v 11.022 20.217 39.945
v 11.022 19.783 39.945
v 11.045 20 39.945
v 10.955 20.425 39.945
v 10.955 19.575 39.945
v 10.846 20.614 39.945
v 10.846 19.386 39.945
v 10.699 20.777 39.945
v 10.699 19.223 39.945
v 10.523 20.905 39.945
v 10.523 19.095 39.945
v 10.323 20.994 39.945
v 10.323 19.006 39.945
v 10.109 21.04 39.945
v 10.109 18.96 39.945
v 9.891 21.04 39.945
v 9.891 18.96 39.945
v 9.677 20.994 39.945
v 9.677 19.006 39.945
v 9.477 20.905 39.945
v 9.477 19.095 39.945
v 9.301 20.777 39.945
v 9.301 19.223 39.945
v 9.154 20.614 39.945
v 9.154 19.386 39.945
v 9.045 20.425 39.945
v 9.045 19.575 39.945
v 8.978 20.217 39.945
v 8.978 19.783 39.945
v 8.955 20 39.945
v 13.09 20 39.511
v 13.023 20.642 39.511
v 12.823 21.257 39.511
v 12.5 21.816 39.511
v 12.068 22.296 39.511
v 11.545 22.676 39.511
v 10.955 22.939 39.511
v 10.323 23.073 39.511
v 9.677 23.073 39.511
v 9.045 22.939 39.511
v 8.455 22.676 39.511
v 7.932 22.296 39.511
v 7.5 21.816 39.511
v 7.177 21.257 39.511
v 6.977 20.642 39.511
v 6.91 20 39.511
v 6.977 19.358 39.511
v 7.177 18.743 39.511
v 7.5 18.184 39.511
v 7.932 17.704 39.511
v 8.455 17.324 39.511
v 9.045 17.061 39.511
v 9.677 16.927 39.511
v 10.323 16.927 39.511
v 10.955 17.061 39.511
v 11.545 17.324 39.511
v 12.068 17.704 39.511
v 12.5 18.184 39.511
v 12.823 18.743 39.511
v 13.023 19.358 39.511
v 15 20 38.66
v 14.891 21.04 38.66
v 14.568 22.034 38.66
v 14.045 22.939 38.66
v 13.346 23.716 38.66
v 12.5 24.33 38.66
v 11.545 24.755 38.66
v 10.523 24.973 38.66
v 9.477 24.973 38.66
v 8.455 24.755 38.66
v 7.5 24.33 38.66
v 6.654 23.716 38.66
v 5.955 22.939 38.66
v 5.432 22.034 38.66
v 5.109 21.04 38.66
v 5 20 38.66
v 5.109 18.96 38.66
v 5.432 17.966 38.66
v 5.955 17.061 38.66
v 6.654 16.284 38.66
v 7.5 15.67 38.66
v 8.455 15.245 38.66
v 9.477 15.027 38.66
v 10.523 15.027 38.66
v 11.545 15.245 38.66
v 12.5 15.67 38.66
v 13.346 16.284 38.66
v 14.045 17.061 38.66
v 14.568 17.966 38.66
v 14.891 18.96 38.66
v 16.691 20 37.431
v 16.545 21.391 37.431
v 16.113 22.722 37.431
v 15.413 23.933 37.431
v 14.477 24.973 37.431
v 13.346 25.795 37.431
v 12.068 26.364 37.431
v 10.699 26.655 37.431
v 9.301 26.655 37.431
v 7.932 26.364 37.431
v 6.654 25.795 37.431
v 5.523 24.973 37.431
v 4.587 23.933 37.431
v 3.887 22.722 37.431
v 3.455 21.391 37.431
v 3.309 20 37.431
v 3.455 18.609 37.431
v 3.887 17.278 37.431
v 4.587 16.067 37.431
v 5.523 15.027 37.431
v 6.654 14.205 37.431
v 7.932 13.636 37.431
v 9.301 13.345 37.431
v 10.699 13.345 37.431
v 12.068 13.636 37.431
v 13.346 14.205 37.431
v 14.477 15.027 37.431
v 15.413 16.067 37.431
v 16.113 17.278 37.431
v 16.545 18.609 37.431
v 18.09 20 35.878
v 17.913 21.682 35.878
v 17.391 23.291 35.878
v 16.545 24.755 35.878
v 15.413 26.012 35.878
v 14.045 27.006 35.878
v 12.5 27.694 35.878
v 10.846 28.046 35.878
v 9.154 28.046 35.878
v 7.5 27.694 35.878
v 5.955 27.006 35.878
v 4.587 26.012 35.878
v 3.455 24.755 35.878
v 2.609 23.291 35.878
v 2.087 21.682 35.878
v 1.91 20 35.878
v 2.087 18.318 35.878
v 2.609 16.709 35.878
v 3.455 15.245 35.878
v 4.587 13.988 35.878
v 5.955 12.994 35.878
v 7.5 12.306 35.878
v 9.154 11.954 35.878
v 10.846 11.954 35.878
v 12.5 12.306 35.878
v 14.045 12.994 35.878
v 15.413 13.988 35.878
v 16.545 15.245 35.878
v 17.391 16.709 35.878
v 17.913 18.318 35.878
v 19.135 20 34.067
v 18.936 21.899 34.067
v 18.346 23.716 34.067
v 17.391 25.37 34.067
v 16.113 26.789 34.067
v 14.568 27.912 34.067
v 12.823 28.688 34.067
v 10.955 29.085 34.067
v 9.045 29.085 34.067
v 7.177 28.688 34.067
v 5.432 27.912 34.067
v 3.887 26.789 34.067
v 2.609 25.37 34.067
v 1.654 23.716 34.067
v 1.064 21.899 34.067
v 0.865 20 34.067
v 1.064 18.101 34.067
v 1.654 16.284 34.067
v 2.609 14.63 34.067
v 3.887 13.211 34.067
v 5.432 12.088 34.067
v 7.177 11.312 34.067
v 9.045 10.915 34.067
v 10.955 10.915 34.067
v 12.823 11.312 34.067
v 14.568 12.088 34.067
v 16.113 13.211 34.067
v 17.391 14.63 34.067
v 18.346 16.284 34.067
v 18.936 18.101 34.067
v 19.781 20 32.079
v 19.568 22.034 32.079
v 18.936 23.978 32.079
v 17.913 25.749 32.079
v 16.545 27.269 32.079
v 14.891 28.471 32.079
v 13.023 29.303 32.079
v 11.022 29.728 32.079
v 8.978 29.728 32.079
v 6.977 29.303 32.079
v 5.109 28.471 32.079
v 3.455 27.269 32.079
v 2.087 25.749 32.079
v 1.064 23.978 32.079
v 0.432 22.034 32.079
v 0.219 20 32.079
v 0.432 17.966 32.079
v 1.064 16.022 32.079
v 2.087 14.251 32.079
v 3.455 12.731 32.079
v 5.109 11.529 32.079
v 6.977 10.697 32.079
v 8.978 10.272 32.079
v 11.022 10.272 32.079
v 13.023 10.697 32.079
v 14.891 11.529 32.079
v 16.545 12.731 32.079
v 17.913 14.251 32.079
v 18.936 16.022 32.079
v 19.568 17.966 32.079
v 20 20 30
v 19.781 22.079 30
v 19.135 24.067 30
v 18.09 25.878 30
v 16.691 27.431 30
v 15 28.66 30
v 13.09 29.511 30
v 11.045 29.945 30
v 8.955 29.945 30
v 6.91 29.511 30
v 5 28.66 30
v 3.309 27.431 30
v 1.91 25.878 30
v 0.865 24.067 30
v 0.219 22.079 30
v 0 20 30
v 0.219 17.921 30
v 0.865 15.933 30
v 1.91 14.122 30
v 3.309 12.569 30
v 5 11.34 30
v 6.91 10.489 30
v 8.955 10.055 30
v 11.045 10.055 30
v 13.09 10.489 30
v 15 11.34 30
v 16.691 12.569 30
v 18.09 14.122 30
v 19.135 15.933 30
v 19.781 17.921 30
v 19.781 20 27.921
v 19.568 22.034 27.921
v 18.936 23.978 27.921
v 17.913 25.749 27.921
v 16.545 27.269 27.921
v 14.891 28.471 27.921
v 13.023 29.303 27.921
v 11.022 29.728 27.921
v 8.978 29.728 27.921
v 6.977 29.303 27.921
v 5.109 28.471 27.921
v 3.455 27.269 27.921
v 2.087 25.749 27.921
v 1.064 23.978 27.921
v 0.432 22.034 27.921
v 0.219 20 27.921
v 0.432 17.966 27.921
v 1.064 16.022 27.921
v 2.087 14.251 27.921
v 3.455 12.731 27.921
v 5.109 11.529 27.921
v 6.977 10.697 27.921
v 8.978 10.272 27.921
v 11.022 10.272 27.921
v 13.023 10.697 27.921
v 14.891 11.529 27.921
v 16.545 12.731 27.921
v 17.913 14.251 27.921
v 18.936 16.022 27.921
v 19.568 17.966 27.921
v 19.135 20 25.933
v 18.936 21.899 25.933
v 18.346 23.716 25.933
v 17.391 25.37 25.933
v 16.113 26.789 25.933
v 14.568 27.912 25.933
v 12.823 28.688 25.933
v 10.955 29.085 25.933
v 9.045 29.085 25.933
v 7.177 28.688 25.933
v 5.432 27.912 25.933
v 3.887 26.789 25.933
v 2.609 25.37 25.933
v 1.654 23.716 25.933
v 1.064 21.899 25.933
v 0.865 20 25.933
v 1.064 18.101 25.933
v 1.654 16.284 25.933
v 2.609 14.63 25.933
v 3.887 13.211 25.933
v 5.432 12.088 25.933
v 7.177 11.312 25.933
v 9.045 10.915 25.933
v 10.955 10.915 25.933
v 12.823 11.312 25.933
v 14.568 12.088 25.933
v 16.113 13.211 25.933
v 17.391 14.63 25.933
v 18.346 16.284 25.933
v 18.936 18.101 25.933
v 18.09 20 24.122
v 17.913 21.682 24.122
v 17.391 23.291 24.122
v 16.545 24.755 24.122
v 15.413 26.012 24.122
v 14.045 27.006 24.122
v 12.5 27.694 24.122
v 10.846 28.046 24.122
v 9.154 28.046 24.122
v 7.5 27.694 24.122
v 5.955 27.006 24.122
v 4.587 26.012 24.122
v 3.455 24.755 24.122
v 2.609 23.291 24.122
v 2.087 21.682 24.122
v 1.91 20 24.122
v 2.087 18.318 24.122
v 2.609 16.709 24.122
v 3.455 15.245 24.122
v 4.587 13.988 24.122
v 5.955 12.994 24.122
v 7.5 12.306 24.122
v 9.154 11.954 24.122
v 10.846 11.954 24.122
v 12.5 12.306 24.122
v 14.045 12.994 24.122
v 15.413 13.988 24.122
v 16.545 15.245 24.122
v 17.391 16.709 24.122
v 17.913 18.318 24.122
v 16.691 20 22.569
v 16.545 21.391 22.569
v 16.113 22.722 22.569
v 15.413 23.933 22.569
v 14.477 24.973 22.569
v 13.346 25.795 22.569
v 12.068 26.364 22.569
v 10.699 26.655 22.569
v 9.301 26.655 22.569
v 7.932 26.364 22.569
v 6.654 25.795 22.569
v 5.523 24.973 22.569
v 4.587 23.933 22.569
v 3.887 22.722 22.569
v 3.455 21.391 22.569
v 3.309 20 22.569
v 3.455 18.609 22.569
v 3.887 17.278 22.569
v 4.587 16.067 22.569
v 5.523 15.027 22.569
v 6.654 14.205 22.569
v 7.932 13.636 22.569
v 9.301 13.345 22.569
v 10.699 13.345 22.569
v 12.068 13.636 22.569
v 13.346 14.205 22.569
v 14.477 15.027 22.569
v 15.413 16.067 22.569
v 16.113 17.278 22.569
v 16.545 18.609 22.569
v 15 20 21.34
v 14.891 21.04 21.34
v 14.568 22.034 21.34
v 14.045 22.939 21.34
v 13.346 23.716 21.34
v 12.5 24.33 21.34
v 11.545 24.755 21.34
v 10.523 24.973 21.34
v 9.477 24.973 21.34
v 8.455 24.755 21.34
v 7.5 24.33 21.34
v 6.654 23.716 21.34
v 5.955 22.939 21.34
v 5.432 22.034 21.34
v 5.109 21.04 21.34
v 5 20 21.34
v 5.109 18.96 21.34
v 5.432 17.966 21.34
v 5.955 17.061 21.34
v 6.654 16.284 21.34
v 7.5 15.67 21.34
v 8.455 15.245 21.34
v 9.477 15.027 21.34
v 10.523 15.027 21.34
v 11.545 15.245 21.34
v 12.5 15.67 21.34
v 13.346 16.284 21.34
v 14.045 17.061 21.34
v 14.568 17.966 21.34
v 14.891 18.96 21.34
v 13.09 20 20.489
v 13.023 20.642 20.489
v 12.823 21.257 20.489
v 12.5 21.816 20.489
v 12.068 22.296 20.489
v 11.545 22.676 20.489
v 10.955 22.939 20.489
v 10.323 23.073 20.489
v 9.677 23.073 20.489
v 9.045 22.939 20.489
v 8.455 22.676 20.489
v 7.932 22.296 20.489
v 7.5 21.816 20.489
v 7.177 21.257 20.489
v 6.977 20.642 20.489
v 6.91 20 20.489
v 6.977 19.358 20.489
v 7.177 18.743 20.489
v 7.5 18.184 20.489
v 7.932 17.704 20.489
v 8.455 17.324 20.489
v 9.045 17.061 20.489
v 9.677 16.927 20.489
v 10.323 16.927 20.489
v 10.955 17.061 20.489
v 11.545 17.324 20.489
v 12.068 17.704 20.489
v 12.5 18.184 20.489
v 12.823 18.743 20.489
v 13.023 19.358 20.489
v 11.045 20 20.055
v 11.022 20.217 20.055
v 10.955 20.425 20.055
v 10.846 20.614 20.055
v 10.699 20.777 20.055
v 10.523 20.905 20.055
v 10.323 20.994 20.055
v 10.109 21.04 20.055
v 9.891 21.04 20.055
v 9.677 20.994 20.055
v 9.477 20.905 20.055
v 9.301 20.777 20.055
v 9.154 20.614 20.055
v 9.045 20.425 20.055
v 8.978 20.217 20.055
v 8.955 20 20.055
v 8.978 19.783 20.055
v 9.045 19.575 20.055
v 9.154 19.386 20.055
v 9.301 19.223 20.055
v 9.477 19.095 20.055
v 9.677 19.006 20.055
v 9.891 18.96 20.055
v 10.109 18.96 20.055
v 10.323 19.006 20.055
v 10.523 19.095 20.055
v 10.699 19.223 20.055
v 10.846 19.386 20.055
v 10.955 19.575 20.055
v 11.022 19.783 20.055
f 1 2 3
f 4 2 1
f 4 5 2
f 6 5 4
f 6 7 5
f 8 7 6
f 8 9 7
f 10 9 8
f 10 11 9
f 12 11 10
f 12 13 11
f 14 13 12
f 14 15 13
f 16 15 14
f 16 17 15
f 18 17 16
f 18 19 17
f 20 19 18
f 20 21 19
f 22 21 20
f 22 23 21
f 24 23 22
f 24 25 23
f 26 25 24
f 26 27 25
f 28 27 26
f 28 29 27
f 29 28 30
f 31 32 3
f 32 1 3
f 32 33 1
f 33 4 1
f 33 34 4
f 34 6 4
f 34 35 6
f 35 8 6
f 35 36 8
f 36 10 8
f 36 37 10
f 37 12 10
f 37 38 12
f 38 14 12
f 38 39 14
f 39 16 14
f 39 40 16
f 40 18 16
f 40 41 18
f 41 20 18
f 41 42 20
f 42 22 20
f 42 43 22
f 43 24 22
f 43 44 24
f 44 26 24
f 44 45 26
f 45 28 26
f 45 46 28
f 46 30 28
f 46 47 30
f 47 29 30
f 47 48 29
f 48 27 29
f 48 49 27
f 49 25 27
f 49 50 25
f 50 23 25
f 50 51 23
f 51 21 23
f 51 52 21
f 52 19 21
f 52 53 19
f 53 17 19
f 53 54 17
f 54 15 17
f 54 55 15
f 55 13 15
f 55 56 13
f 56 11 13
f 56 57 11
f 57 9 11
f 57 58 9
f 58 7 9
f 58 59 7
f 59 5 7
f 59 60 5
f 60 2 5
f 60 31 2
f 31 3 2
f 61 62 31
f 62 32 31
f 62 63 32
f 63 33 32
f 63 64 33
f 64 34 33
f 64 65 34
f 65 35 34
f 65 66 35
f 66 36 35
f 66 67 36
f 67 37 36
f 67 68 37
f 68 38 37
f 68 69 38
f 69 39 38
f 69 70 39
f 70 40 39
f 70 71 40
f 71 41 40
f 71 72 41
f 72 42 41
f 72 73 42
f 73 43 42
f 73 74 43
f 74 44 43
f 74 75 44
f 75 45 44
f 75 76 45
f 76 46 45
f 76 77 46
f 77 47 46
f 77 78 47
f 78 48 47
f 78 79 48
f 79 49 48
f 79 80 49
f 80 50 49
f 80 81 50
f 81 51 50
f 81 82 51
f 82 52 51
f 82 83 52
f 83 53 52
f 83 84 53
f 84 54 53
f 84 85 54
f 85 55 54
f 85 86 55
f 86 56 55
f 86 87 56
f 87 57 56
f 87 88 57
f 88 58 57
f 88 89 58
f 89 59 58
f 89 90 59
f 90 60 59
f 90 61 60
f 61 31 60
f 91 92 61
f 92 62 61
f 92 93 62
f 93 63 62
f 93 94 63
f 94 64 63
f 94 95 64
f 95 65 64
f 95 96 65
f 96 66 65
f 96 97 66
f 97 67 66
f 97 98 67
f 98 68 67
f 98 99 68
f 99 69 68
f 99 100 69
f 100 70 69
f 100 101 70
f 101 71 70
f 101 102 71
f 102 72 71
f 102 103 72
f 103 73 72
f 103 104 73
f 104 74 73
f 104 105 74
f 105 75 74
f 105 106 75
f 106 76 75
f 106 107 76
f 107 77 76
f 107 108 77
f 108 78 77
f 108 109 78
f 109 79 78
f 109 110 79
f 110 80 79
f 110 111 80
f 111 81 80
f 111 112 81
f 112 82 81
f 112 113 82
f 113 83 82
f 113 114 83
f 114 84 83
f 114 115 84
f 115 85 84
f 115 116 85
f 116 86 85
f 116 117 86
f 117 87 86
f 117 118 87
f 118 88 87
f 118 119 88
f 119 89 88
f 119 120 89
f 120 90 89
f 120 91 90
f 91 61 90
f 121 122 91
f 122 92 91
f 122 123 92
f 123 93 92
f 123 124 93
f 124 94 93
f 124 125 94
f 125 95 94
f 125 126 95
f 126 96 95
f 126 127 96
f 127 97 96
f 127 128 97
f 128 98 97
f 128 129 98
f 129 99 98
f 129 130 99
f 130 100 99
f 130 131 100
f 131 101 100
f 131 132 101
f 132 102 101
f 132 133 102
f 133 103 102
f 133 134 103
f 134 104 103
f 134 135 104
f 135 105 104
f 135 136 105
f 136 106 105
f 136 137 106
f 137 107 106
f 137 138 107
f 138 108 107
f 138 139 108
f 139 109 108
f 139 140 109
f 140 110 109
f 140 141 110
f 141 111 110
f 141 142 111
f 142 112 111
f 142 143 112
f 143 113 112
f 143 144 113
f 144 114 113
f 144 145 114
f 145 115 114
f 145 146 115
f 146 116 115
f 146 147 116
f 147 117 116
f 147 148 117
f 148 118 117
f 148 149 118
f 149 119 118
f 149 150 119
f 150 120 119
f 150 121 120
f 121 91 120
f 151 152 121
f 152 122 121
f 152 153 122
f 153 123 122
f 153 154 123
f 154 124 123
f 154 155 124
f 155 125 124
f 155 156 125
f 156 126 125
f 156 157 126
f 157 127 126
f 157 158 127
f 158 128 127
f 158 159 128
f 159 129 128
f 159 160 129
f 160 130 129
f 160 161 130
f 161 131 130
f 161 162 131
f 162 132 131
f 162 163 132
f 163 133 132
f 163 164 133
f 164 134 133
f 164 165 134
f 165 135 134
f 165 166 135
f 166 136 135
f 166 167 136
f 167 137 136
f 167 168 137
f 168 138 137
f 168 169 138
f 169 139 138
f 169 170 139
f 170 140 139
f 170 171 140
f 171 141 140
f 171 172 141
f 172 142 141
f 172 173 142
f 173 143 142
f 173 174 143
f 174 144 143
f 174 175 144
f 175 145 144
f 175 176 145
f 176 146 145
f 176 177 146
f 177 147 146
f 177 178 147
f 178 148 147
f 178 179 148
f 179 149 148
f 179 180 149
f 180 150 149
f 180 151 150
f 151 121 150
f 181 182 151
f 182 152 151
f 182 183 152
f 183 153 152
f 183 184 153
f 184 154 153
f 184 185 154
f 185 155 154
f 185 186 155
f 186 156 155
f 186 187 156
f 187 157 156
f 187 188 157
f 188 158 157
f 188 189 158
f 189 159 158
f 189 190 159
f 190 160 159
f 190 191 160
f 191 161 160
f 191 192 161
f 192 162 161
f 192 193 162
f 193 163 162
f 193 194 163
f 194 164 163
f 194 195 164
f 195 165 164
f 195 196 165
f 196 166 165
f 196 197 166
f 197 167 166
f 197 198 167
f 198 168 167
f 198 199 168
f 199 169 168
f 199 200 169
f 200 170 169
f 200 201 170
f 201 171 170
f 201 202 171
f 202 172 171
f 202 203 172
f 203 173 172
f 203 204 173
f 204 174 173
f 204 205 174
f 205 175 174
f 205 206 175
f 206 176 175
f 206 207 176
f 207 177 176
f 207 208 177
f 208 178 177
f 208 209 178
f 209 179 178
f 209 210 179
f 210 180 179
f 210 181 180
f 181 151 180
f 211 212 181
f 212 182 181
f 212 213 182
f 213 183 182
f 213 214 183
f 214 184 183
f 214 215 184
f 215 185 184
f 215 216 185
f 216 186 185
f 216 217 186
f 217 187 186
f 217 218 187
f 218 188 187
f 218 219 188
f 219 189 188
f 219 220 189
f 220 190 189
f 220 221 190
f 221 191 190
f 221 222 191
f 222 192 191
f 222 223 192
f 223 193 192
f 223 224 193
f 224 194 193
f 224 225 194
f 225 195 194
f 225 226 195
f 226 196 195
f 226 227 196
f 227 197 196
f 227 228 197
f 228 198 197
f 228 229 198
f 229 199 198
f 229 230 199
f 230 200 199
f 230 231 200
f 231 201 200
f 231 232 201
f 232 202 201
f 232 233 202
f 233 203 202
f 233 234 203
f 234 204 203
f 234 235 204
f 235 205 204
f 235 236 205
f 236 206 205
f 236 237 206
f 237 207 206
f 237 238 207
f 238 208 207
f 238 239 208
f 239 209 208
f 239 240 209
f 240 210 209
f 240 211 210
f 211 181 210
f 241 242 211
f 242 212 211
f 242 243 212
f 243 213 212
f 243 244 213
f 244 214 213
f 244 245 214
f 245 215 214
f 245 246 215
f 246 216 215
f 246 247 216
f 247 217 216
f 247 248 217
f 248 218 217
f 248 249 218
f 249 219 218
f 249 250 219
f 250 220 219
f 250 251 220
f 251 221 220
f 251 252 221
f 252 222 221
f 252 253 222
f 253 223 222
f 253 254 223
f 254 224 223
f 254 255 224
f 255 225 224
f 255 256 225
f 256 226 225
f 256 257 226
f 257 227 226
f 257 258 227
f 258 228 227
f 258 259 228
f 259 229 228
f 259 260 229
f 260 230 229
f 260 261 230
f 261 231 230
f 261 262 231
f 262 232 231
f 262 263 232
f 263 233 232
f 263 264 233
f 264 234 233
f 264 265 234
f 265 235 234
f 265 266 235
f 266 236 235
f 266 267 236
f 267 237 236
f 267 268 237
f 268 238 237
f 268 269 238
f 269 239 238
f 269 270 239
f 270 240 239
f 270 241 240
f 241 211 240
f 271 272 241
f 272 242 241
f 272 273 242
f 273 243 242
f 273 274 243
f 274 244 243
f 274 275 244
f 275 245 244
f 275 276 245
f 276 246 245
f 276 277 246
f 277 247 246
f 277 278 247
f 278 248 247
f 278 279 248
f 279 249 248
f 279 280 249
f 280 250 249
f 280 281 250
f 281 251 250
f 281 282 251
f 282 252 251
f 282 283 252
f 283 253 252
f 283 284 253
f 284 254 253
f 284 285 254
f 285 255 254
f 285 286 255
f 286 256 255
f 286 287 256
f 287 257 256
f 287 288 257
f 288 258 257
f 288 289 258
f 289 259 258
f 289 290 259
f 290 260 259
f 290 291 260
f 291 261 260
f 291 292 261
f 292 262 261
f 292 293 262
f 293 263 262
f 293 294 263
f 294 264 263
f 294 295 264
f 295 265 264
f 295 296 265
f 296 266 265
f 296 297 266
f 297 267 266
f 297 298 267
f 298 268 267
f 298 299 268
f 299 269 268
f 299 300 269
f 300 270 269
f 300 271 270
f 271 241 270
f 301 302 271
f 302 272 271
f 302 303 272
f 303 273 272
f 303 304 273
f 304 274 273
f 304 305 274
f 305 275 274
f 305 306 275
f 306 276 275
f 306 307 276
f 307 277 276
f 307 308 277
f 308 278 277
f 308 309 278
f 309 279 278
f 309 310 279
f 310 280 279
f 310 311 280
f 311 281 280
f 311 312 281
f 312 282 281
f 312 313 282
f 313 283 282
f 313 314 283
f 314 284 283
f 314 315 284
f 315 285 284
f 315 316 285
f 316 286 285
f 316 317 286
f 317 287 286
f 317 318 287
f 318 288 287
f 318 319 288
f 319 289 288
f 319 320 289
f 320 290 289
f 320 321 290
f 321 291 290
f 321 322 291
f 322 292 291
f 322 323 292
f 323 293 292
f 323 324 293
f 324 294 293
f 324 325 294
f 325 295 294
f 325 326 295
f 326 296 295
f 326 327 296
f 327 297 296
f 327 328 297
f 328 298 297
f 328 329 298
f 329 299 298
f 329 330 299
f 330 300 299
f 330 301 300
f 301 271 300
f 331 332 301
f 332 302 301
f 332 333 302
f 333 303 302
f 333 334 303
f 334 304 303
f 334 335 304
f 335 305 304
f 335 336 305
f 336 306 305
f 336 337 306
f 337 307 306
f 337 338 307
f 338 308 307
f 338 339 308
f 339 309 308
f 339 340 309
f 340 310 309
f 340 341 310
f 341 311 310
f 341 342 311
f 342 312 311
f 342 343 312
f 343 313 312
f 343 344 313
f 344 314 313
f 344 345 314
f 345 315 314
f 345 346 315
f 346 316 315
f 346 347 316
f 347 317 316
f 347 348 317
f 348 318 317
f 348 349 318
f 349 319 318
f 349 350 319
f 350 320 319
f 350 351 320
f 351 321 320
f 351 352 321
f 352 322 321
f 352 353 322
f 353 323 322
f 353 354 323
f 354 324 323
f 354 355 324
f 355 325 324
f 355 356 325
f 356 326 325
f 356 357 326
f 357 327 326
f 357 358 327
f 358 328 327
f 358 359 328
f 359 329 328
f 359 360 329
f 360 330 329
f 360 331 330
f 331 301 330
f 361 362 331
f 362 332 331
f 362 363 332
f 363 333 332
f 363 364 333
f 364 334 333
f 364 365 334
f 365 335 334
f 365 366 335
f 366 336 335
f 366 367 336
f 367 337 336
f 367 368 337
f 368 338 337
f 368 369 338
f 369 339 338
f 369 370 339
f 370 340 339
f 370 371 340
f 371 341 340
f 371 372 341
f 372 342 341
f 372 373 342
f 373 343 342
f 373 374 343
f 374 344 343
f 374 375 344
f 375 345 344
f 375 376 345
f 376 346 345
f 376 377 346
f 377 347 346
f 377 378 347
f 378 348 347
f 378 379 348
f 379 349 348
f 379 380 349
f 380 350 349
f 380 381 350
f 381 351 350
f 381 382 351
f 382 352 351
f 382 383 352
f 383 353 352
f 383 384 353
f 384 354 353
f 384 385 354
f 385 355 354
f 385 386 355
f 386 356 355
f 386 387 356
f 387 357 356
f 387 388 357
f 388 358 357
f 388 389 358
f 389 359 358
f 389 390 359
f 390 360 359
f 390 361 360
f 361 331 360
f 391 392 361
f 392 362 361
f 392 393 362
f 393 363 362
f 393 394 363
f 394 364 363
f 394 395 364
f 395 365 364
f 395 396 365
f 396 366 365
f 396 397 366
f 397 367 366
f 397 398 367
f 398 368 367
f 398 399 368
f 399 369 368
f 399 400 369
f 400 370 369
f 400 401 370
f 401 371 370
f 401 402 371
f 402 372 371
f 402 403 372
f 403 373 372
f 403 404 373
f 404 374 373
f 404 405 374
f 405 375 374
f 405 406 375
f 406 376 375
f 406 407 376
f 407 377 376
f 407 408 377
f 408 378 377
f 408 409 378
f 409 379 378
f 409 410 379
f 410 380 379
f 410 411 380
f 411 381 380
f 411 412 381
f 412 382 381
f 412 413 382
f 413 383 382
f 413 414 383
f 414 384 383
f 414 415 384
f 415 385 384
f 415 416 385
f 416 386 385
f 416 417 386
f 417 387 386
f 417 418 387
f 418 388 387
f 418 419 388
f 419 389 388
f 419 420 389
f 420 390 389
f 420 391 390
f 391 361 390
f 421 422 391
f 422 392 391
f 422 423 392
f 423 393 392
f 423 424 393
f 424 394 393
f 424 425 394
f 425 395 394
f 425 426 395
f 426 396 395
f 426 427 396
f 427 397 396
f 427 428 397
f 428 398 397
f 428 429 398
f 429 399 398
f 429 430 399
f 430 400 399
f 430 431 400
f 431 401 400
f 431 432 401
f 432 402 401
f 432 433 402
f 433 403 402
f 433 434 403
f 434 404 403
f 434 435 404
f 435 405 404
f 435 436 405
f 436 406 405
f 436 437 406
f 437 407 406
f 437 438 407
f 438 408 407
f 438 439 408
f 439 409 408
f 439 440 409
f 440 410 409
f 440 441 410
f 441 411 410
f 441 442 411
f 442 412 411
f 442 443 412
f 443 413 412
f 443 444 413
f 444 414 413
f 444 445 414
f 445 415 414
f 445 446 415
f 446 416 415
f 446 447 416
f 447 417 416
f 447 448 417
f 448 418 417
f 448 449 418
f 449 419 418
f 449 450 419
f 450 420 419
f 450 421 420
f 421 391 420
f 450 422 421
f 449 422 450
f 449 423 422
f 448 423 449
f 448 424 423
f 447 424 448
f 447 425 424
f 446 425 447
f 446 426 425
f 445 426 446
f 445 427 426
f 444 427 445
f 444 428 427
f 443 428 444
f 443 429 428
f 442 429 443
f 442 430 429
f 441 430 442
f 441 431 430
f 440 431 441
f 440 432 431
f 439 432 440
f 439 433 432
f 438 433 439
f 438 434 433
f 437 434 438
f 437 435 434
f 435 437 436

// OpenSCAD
// Unit of length: Unit.MM
translate(v = [10.0, 20.0, 30.0])
{
   sphere(r = 10.0);
}
